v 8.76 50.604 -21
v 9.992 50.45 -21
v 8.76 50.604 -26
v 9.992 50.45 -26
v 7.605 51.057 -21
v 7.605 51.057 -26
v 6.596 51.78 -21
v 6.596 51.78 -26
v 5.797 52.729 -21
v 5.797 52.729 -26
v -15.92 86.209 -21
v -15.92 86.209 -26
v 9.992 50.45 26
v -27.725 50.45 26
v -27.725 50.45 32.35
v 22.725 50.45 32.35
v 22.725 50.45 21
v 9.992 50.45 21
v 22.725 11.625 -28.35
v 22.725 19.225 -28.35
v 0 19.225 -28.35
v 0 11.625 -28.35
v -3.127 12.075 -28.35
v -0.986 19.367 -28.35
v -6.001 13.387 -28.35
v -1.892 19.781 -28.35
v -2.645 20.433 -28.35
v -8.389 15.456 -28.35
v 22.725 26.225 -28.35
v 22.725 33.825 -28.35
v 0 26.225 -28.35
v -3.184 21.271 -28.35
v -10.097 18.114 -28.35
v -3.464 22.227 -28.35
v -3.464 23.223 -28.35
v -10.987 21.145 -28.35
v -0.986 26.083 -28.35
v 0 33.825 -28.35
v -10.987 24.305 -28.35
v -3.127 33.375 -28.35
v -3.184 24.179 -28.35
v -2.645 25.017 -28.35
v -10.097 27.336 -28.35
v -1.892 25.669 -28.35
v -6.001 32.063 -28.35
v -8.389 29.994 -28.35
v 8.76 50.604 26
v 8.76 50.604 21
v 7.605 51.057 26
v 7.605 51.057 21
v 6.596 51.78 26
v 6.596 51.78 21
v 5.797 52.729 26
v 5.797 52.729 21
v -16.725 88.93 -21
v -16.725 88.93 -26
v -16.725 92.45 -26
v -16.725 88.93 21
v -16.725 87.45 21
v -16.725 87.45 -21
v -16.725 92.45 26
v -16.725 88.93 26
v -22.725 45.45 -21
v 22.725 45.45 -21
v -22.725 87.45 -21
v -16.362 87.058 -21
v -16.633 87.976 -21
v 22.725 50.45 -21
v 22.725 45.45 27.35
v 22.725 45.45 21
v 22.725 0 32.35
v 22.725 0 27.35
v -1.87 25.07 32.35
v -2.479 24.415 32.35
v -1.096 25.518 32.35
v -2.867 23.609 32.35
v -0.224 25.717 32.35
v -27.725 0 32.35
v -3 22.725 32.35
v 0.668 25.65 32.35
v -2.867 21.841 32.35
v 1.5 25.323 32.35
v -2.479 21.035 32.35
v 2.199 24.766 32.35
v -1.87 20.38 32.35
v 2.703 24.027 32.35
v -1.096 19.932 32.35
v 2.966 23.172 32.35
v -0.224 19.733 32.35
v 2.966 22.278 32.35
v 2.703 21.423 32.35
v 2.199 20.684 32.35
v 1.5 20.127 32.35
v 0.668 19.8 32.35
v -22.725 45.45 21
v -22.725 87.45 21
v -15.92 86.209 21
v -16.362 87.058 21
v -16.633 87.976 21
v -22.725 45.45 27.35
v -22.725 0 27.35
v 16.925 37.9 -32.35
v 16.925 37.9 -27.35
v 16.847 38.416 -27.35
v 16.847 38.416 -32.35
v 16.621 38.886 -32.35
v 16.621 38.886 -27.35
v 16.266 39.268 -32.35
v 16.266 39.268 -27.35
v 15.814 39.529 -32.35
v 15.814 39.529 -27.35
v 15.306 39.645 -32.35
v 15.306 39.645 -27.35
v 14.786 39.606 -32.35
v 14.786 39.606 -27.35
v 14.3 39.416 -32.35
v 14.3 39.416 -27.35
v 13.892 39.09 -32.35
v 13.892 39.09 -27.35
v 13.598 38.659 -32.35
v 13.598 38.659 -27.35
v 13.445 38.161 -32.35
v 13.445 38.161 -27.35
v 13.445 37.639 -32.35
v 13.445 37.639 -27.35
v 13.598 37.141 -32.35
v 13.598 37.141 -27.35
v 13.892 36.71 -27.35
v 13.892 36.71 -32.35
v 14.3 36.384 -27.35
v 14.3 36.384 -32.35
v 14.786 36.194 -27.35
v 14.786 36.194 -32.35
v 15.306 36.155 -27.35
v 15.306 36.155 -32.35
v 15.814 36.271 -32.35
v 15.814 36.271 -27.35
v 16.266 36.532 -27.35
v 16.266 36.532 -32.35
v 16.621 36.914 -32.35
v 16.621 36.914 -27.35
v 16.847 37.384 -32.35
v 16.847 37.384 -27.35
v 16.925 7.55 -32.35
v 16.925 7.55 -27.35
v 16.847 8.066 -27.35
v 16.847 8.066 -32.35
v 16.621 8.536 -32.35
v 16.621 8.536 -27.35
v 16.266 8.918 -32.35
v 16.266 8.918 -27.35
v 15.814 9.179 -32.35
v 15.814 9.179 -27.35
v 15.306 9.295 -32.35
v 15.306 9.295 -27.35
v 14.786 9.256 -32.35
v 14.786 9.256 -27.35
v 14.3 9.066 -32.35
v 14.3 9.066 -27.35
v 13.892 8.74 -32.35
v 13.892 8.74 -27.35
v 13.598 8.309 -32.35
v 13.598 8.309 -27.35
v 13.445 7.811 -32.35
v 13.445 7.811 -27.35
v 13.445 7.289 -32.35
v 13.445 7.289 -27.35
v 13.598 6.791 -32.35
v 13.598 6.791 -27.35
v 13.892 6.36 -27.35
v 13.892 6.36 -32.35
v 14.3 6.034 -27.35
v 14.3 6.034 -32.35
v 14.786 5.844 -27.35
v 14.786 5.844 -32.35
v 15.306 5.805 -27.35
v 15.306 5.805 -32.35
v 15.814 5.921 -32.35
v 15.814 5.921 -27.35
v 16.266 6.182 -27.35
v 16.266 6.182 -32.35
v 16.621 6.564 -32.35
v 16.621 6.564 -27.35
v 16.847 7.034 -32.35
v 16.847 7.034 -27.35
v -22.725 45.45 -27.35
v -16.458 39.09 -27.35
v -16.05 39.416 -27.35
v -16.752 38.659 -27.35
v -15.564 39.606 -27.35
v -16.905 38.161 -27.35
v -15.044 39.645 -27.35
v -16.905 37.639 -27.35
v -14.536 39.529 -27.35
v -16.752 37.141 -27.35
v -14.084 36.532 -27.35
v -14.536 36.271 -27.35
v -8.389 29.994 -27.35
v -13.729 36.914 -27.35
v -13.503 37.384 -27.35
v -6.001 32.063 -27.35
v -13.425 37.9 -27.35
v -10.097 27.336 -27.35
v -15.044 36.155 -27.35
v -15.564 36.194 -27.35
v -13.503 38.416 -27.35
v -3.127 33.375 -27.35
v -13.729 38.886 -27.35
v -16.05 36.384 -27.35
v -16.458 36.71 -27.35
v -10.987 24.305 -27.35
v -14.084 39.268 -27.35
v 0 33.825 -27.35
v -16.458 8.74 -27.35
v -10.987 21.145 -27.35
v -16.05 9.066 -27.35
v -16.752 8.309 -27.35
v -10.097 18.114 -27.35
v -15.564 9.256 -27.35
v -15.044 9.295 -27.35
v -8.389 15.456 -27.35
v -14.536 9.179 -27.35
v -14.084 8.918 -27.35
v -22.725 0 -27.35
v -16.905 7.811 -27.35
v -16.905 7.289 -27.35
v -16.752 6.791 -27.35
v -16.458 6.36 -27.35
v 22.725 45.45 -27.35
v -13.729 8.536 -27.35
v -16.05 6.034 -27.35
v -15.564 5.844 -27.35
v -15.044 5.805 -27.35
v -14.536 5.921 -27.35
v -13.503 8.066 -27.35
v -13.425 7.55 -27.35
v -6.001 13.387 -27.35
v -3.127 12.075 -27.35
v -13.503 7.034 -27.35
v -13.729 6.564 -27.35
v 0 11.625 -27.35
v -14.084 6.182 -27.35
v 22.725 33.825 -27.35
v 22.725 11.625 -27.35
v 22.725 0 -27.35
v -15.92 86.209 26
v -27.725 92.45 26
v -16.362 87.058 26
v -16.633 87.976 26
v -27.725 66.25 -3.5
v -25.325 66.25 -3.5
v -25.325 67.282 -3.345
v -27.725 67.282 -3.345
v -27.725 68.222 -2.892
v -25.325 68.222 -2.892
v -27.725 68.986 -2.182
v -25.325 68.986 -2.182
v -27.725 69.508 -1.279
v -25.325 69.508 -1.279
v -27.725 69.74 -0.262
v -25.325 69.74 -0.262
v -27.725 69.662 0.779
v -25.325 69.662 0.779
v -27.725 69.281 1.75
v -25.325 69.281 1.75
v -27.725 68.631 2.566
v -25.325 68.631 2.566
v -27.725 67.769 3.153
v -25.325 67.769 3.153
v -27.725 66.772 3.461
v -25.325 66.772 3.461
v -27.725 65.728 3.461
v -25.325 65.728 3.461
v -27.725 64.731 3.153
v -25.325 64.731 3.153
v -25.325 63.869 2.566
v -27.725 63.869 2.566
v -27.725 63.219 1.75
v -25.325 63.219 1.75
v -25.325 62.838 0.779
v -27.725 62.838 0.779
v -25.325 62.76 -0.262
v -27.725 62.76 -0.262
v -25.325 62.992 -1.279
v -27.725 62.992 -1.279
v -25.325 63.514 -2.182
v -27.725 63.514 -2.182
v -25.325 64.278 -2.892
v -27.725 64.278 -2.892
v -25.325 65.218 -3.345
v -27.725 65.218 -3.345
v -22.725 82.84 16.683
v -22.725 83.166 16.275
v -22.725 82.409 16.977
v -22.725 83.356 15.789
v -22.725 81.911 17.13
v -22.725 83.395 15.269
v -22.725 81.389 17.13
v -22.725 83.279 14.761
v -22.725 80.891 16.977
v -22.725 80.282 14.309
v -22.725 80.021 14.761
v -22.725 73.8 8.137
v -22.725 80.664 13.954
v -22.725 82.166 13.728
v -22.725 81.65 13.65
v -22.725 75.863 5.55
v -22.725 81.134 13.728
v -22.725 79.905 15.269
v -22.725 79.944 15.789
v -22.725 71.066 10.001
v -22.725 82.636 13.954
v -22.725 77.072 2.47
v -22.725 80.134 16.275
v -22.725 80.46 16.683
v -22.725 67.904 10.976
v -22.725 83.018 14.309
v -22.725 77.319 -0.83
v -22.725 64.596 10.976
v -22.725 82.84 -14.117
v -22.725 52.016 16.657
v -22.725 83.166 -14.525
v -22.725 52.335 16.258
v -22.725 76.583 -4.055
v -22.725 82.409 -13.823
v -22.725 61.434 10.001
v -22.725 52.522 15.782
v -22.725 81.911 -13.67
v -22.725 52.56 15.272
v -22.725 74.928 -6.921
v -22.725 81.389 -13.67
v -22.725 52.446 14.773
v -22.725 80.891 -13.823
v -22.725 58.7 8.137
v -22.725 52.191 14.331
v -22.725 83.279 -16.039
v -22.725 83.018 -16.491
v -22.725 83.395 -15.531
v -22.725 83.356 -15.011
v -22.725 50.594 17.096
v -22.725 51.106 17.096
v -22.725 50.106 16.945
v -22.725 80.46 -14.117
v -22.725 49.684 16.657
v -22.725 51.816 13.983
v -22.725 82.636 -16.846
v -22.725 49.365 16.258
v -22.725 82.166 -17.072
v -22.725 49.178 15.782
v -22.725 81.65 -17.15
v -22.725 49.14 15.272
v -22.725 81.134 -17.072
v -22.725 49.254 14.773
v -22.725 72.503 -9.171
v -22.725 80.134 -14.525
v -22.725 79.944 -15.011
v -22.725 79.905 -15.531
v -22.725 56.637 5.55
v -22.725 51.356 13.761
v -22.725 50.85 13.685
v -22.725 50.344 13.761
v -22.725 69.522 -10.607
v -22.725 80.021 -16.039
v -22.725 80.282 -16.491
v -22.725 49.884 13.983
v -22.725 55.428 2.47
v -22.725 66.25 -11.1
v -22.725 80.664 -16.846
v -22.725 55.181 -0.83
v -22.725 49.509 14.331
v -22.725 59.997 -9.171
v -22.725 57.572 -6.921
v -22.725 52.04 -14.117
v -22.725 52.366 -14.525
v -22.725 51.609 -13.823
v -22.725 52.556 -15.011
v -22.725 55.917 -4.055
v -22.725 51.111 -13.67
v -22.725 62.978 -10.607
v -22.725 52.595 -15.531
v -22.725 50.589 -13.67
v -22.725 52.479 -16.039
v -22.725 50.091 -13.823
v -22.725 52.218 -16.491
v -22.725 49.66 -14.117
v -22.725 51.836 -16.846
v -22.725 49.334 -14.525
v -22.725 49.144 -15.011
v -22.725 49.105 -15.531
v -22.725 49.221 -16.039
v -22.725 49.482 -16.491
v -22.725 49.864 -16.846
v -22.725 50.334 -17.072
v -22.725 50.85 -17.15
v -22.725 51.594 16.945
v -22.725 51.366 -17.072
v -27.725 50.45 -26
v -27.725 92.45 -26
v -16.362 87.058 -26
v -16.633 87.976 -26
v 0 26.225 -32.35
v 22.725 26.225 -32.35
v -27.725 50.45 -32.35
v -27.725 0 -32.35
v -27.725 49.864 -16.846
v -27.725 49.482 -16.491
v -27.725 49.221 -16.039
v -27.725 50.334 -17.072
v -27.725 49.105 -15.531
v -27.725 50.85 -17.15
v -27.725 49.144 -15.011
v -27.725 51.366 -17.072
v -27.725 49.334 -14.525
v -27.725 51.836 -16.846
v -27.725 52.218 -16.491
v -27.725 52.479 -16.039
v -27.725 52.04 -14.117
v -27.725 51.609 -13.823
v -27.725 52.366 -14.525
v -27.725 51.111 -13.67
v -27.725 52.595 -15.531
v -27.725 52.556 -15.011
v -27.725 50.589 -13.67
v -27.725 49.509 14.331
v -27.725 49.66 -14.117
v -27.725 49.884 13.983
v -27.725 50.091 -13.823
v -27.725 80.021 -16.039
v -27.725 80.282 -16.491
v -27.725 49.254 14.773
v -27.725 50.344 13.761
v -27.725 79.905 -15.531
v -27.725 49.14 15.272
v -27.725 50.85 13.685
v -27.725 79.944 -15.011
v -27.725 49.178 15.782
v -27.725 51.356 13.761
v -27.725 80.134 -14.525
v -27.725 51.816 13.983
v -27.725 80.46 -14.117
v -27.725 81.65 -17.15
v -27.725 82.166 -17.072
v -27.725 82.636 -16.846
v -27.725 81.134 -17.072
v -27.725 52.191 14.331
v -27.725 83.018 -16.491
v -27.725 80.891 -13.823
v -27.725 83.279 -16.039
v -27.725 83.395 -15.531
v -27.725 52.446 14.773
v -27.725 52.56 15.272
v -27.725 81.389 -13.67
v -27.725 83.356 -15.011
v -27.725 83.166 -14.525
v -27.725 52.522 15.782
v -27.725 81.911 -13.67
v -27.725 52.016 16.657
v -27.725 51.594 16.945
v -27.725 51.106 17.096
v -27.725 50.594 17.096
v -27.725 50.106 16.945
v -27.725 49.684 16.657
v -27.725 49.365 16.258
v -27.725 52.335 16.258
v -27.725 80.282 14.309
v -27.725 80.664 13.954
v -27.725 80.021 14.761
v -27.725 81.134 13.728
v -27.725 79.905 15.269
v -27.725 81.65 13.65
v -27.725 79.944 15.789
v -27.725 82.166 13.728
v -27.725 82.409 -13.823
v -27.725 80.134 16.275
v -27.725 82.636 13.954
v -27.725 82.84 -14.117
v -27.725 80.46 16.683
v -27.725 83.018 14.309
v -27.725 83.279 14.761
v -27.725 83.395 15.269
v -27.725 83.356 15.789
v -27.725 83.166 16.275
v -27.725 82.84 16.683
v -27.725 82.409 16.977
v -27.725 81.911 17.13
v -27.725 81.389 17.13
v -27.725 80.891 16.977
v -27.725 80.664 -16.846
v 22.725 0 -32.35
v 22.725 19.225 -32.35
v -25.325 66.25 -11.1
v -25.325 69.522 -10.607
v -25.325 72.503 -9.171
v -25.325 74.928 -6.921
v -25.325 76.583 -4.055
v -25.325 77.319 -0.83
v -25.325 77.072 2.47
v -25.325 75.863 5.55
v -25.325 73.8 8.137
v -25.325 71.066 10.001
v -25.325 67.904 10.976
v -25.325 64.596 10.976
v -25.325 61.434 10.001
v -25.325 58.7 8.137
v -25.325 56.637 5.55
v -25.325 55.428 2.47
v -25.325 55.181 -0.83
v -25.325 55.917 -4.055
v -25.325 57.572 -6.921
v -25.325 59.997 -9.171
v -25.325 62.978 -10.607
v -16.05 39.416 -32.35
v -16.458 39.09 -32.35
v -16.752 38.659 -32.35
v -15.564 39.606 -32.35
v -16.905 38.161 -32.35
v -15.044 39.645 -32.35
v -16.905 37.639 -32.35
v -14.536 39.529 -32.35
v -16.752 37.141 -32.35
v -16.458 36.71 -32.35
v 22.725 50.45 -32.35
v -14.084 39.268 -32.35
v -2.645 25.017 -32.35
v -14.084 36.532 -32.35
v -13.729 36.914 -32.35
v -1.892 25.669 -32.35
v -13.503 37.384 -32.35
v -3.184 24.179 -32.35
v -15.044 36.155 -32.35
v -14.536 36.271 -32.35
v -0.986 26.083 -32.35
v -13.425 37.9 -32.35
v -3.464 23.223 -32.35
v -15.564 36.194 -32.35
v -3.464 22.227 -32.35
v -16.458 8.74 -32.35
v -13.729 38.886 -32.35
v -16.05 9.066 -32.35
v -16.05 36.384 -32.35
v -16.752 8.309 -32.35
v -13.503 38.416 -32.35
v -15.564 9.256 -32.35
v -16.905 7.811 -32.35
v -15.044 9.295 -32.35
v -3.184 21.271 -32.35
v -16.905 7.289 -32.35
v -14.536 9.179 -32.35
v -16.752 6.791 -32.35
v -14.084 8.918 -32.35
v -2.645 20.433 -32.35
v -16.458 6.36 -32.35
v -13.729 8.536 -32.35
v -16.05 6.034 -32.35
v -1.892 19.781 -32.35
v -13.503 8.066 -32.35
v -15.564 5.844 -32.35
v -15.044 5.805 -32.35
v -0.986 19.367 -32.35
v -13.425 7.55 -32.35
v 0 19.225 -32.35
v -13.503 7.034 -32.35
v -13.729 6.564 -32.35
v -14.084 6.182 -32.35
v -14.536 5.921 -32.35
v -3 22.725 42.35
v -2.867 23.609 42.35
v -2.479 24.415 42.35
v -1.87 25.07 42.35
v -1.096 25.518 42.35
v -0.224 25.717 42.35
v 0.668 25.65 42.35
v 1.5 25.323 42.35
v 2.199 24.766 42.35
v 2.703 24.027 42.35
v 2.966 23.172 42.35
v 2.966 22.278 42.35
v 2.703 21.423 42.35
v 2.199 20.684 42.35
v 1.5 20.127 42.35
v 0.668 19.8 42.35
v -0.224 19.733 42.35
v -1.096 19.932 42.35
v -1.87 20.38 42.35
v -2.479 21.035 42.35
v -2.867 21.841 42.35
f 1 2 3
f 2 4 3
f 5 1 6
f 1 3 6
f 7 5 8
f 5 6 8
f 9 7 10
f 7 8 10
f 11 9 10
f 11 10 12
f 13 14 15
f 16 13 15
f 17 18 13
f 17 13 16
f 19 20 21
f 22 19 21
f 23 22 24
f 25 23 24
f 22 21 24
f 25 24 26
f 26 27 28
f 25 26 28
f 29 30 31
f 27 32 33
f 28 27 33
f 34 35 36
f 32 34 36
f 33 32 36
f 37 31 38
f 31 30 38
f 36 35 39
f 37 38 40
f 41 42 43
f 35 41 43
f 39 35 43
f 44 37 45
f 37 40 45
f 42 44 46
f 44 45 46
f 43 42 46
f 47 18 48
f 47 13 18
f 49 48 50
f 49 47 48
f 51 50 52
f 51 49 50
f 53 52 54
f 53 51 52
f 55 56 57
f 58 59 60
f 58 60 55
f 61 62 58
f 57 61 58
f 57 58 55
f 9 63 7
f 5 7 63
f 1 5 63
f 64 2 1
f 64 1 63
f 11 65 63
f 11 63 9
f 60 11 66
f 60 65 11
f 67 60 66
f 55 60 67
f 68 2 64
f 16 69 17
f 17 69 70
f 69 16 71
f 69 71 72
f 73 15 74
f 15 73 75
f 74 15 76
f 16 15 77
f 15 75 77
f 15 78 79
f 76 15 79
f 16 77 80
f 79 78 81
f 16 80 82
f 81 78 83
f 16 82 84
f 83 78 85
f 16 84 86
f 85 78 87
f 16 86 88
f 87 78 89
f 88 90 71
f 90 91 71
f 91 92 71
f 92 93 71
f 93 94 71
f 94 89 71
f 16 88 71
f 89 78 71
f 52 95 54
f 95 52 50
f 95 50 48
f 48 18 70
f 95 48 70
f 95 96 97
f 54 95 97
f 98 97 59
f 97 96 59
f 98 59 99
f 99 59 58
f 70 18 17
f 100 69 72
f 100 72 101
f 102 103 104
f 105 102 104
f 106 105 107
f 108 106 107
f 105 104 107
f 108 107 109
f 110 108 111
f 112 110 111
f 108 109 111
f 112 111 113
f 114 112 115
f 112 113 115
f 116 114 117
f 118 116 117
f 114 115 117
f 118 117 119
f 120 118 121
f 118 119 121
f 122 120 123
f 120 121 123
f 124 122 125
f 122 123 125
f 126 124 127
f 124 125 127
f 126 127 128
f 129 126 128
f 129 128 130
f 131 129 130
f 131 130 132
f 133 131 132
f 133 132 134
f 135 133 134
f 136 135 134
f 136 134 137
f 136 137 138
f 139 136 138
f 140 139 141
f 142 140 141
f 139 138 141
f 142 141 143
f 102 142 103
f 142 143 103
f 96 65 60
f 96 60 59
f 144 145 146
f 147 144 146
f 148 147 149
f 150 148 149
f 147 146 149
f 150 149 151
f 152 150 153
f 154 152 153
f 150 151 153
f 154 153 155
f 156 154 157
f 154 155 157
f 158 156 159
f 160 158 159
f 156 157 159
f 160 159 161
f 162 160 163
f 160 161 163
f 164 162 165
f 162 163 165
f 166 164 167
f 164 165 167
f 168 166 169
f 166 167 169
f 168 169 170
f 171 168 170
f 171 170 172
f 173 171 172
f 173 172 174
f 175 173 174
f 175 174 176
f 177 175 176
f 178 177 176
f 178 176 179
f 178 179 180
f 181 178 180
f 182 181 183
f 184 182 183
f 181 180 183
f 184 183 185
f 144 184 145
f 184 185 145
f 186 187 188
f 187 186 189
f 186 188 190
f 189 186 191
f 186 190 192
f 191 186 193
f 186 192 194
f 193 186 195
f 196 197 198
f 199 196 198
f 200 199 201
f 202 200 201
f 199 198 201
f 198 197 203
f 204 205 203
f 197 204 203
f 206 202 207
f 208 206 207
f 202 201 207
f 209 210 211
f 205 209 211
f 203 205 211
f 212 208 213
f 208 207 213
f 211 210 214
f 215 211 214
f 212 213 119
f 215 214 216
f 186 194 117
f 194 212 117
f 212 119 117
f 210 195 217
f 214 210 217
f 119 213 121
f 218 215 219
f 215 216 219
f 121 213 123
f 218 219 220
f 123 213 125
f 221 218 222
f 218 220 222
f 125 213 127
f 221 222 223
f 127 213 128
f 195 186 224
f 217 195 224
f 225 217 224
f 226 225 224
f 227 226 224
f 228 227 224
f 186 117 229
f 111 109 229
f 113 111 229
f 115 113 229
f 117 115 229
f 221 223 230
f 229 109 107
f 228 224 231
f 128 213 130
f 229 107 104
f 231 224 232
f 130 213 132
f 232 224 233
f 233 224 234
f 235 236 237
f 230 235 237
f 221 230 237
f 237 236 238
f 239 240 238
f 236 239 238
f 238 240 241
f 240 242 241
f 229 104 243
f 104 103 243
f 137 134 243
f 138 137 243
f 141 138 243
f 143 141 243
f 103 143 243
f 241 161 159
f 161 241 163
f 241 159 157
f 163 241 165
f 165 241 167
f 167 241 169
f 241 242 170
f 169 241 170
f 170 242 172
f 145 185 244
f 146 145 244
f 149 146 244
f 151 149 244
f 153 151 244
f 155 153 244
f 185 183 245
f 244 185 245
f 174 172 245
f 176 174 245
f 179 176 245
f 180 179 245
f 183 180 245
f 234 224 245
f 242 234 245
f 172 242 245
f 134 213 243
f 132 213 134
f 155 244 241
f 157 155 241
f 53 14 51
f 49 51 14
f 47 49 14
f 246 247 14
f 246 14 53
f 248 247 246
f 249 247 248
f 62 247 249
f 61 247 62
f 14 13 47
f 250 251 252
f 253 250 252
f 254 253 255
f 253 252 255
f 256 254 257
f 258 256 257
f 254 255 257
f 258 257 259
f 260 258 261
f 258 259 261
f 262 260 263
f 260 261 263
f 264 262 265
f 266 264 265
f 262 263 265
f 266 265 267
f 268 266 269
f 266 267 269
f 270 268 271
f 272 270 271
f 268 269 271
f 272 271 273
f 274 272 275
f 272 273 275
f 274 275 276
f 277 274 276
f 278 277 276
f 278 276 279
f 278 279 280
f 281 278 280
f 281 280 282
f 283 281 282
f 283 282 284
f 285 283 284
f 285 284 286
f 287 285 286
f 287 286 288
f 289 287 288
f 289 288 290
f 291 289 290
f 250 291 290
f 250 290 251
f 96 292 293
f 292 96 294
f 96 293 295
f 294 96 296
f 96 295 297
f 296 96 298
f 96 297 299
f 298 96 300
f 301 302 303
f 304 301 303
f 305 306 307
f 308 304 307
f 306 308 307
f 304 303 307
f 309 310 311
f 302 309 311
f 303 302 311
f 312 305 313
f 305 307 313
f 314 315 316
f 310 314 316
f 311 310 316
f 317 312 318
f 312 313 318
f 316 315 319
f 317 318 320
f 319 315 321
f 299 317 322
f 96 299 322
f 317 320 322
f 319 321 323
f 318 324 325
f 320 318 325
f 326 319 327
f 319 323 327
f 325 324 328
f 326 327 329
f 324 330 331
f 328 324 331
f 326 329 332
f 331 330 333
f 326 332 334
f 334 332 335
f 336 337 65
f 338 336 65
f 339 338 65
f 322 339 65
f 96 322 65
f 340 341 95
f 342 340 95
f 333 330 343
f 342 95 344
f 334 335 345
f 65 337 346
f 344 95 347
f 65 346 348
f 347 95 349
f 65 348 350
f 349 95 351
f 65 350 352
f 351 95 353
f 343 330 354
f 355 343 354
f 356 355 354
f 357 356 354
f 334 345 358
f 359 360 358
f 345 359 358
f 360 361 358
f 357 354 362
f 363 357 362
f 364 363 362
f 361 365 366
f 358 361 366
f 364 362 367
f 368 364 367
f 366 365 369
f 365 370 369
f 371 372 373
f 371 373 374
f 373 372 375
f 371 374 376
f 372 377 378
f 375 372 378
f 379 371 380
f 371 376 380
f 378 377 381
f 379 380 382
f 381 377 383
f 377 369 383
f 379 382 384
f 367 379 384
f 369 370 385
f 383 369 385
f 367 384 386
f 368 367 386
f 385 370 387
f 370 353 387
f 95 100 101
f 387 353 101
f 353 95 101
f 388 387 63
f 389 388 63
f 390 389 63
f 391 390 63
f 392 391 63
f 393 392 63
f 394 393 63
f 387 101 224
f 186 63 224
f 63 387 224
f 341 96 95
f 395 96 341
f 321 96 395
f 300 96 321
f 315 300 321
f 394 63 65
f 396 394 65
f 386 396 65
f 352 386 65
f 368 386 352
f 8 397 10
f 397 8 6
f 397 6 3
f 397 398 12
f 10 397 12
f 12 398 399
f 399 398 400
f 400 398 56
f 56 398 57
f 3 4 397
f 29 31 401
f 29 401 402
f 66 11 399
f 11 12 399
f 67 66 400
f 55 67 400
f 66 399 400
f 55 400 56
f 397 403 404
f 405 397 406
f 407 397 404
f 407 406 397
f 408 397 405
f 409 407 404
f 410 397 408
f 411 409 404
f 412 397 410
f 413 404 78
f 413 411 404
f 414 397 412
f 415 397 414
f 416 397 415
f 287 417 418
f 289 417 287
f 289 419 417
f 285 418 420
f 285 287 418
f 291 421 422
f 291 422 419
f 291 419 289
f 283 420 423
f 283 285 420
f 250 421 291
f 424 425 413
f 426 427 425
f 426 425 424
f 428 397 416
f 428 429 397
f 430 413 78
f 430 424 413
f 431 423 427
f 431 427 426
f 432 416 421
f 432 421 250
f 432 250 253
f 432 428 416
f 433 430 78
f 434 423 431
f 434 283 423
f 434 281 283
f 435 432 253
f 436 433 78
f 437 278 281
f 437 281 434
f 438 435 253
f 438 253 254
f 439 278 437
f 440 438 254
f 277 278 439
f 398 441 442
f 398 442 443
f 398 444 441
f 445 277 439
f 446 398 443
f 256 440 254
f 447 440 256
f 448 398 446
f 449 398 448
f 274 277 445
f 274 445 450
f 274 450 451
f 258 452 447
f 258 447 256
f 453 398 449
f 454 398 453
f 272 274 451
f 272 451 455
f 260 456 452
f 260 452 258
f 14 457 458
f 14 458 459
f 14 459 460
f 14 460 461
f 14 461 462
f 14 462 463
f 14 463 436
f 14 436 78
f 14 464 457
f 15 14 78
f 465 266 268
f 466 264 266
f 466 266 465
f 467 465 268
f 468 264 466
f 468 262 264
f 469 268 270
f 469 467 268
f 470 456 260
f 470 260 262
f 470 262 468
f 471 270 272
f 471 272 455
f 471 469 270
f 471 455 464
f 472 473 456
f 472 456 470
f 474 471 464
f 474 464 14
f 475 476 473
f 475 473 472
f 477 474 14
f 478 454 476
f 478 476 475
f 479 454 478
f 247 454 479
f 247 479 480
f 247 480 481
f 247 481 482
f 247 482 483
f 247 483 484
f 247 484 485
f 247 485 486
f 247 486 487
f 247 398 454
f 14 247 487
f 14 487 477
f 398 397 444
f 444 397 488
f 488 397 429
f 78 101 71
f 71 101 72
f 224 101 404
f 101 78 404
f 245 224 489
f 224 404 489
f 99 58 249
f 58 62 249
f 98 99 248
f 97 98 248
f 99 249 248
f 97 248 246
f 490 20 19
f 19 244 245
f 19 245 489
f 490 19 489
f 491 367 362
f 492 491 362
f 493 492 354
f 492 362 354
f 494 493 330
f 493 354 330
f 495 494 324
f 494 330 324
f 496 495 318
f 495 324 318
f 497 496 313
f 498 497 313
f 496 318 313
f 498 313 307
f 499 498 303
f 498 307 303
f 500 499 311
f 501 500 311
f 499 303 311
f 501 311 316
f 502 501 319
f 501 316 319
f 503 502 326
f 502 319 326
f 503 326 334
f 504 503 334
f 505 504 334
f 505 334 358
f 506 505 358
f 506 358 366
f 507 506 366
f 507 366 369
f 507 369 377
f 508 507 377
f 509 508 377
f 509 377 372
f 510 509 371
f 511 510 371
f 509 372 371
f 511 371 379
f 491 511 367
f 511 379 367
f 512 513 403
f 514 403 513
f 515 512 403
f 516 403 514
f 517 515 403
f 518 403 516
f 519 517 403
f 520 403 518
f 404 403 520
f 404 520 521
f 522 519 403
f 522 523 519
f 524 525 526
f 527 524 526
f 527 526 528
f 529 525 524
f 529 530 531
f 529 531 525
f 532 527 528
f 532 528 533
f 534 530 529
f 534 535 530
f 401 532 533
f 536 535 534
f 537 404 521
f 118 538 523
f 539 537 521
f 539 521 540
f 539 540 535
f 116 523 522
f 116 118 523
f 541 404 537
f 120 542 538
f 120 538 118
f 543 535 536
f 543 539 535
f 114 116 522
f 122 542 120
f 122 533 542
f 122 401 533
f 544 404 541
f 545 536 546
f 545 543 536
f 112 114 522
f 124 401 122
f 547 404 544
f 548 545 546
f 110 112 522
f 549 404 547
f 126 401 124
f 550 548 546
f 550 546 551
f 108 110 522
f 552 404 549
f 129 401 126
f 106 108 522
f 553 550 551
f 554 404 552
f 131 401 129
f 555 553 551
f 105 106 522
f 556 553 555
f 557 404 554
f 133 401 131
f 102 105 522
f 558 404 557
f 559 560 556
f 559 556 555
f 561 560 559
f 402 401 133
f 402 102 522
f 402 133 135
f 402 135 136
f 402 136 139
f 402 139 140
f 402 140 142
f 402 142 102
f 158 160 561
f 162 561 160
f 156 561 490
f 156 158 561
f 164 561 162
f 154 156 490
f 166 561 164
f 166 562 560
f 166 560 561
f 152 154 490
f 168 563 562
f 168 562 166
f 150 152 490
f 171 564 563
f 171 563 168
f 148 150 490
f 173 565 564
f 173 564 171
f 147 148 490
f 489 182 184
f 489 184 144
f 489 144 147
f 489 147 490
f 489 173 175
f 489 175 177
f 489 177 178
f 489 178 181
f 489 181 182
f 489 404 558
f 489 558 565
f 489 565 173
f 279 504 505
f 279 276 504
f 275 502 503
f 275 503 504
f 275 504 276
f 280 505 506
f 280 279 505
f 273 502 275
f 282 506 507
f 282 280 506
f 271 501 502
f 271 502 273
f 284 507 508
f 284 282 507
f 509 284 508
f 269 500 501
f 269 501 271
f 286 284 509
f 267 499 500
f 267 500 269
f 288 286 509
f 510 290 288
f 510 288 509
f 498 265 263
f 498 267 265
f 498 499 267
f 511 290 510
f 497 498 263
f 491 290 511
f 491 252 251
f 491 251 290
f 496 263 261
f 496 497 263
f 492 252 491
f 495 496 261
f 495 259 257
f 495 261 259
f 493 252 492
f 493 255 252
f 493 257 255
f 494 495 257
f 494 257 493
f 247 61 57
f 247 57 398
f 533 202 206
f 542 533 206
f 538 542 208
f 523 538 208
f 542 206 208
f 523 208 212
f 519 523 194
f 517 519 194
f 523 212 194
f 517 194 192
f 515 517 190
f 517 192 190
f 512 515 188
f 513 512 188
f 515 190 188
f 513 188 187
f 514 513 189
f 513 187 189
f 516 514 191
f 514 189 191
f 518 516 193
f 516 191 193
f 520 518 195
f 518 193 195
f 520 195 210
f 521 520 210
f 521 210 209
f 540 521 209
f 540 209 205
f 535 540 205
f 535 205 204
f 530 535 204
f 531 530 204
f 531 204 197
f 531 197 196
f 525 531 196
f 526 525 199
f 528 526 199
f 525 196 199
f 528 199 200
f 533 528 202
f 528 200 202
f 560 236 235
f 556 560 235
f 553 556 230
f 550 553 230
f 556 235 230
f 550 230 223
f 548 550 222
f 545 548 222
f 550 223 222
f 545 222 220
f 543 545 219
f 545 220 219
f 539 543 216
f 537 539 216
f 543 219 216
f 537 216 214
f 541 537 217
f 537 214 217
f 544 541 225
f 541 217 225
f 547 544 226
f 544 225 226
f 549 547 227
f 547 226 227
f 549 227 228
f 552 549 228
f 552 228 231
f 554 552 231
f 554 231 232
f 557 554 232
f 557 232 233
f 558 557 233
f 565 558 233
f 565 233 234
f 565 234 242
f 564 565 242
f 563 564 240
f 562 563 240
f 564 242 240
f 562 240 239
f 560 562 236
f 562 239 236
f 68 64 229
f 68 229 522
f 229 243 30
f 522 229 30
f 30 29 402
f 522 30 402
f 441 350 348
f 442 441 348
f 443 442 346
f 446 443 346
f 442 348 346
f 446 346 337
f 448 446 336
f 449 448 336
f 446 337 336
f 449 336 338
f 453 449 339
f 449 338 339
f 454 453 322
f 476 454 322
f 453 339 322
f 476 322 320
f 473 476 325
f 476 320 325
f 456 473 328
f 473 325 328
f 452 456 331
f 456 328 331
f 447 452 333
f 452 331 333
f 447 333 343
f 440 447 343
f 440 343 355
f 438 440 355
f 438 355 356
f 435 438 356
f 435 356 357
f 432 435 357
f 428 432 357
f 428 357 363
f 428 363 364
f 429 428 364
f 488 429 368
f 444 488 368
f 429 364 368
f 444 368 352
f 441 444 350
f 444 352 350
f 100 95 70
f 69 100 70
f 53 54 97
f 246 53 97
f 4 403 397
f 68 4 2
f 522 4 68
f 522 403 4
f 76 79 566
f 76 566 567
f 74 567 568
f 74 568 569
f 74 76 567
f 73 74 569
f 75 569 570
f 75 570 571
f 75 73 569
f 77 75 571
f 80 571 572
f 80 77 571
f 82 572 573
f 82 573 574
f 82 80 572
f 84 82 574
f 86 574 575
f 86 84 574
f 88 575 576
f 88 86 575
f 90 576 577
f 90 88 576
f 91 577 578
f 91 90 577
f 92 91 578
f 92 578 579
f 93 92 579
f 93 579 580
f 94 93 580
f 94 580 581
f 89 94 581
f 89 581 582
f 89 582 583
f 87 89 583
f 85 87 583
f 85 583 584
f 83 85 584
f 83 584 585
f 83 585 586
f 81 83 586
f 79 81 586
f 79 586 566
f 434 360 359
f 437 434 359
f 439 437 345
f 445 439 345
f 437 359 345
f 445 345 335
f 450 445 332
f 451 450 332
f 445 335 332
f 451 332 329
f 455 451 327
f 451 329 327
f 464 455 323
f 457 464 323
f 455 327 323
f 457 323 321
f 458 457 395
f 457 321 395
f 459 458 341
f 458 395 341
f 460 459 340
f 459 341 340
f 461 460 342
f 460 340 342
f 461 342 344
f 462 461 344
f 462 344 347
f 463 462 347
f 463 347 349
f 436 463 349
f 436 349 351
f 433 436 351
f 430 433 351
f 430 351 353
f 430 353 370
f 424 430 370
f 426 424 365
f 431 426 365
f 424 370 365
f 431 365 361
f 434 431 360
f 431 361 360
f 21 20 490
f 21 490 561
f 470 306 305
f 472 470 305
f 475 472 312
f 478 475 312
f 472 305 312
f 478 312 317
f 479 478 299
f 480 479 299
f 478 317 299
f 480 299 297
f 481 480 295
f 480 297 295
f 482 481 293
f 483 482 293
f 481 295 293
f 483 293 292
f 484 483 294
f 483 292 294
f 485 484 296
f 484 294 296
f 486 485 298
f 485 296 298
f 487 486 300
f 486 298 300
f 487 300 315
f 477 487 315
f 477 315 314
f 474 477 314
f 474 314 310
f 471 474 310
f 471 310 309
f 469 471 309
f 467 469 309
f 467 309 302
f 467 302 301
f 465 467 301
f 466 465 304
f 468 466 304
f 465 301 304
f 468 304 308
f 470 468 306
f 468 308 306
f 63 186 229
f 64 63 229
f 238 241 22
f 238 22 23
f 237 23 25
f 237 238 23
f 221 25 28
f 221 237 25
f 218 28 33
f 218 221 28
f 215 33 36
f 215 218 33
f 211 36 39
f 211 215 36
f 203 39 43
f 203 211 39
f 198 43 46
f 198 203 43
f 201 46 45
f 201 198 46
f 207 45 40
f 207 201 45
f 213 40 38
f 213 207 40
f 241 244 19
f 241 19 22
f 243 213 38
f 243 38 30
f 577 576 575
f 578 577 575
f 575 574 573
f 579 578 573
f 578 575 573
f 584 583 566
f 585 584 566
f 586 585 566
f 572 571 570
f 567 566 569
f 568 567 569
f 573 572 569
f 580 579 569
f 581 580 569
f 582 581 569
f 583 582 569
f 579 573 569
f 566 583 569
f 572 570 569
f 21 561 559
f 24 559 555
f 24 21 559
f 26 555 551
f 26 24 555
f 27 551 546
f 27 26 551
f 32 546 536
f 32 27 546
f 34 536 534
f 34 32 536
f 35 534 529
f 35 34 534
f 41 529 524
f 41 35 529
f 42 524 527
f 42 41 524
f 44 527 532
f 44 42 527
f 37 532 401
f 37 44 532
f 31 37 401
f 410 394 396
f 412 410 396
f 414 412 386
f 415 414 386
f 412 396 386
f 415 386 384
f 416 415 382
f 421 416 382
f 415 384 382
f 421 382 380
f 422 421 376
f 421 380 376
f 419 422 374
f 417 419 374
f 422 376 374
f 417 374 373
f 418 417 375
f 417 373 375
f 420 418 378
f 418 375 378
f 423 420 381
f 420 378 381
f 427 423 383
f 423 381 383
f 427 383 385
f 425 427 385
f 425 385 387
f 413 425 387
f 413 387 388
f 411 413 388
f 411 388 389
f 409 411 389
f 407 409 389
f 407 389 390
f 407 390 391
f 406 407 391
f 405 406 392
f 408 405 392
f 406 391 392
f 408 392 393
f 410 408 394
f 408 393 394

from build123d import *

# Parameters (mm, degrees)
BOSS_EXTRUDE1_DEPTH = 45.45
CUT_EXTRUDE4_DEPTH  = 1
CUT_EXTRUDE5_DEPTH  = 5
SKETCH9_R           = 1.75
CUT_EXTRUDE6_DEPTH  = 5
BOSS_EXTRUDE2_DEPTH = 5
SKETCH11_R          = 1.75
SKETCH11_R_2        = 1.715
CUT_EXTRUDE7_DEPTH  = 5
SKETCH13_R          = 3.5
CUT_EXTRUDE8_DEPTH  = 5
SKETCH13_3_R        = 11.1
CUT_EXTRUDE9_DEPTH  = 2.6
SKETCH14_W          = 50.45
SKETCH14_H          = 11.35
BOSS_EXTRUDE3_DEPTH = 5
SKETCH15_W          = 50.45
SKETCH15_H          = 11.35
BOSS_EXTRUDE4_DEPTH = 5
SKETCH17_W          = 42
SKETCH17_H          = 5
BOSS_EXTRUDE5_DEPTH = 11
BOSS_EXTRUDE6_DEPTH = 5
BOSS_EXTRUDE7_DEPTH = 5
SKETCH21_R          = 3
BOSS_EXTRUDE8_DEPTH = 15
FILLET1_R           = 5
FILLET2_R           = 5


with BuildPart() as part:
    # Sketch1 → Boss-Extrude1 (new body)
    with BuildSketch(Plane(origin=(0, 0, 0), x_dir=(1, 0, 0), z_dir=(0, 1, 0))):
        Polygon((22.725, 27.35), (22.725, 32.35), (-22.725, 32.35), (-27.725, 32.35), (-27.725, -27.35), (-27.725, -32.35), (22.725, -32.35), (22.725, -27.35), (-22.725, -27.35), (-22.725, 27.35), (0, 27.35), align=None)
    extrude(amount=BOSS_EXTRUDE1_DEPTH)

    # Sketch5 → Cut-Extrude4 (cut)
    with BuildSketch(Plane.XY.offset(-27.35)):
        with BuildLine():
            Line((0, 33.825), (22.725, 33.825))
            Line((22.725, 33.825), (22.725, 11.625))
            Line((22.725, 11.625), (0, 11.625))
            ThreePointArc((0, 11.625), (-11.1, 22.725), (0, 33.825))
        make_face()
    extrude(amount=-CUT_EXTRUDE4_DEPTH, mode=Mode.SUBTRACT)

    # Sketch6 → Cut-Extrude5 (cut)
    with BuildSketch(Plane.XY.offset(-27.35)):
        with BuildLine():
            Line((0, 26.225), (22.725, 26.225))
            Line((22.725, 26.225), (22.725, 19.225))
            Line((22.725, 19.225), (0, 19.225))
            ThreePointArc((0, 19.225), (-3.5, 22.725), (0, 26.225))
        make_face()
    extrude(amount=-CUT_EXTRUDE5_DEPTH, mode=Mode.SUBTRACT)

    # Sketch9 → Cut-Extrude6 (cut)
    with BuildSketch(Plane.XY.offset(-27.35)):
        with Locations((15.175, 37.9)):
            Circle(SKETCH9_R)
        with Locations((-15.175, 37.9)):
            Circle(SKETCH9_R)
        with Locations((15.175, 7.55)):
            Circle(SKETCH9_R)
        with Locations((-15.175, 7.55)):
            Circle(SKETCH9_R)
    extrude(amount=-CUT_EXTRUDE6_DEPTH, mode=Mode.SUBTRACT)

    # Sketch10 → Boss-Extrude2 (add)
    with BuildSketch(Plane(origin=(-22.725, 0, 0), x_dir=(0, 0, -1), z_dir=(1, 0, 0))):
        Polygon((0, 45.45), (21, 45.45), (21, 87.45), (-21, 87.45), (-21, 45.45), align=None)
    extrude(amount=-BOSS_EXTRUDE2_DEPTH)

    # Sketch11 → Cut-Extrude7 (cut)
    with BuildSketch(Plane(origin=(-22.725, 0, 0), x_dir=(0, 0, -1), z_dir=(1, 0, 0))):
        with Locations((-15.4, 81.65)):
            Circle(SKETCH11_R)
        with Locations((15.4, 81.65)):
            Circle(SKETCH11_R)
        with Locations((-15.4, 50.85)):
            Circle(SKETCH11_R_2)
        with Locations((15.4, 50.85)):
            Circle(SKETCH11_R)
    extrude(amount=-CUT_EXTRUDE7_DEPTH, mode=Mode.SUBTRACT)

    # Sketch13 → Cut-Extrude8 (cut)
    with BuildSketch(Plane(origin=(-22.725, 0, 0), x_dir=(0, 0, -1), z_dir=(1, 0, 0))):
        with Locations((0, 66.25)):
            Circle(SKETCH13_R)
    extrude(amount=-CUT_EXTRUDE8_DEPTH, mode=Mode.SUBTRACT)

    # Sketch13<3> → Cut-Extrude9 (cut)
    with BuildSketch(Plane(origin=(-22.725, 0, 0), x_dir=(0, 0, -1), z_dir=(1, 0, 0))):
        with Locations((0, 66.25)):
            Circle(SKETCH13_3_R)
    extrude(amount=-CUT_EXTRUDE9_DEPTH, mode=Mode.SUBTRACT)

    # Sketch14 → Boss-Extrude3 (add)
    with BuildSketch(Plane(origin=(0, 45.45, 0), x_dir=(1, 0, 0), z_dir=(0, 1, 0))):
        with Locations((-2.5, 26.675)):
            Rectangle(SKETCH14_W, SKETCH14_H)
    extrude(amount=BOSS_EXTRUDE3_DEPTH)

    # Sketch15 → Boss-Extrude4 (add)
    with BuildSketch(Plane(origin=(0, 45.45, 0), x_dir=(1, 0, 0), z_dir=(0, 1, 0))):
        with Locations((-2.5, -26.675)):
            Rectangle(SKETCH15_W, SKETCH15_H)
    extrude(amount=BOSS_EXTRUDE4_DEPTH)

    # Sketch17 → Boss-Extrude5 (add)
    with BuildSketch(Plane.ZY.offset(27.725)):
        with Locations((0, 89.95)):
            Rectangle(SKETCH17_W, SKETCH17_H)
    extrude(amount=-BOSS_EXTRUDE5_DEPTH)

    # Sketch19 → Boss-Extrude6 (add)
    with BuildSketch(Plane.XY.offset(21)):
        Polygon((-22.725, 50.45), (7.275, 50.45), (-16.725, 87.45), (-16.725, 92.45), (-27.725, 92.45), (-27.725, 50.45), align=None)
    extrude(amount=BOSS_EXTRUDE6_DEPTH)

    # Sketch20 → Boss-Extrude7 (add)
    with BuildSketch(Plane(origin=(0, 0, -21), x_dir=(-1, 0, 0), z_dir=(0, 0, -1))):
        Polygon((22.725, 50.45), (-7.275, 50.45), (16.725, 87.45), (16.725, 92.45), (27.725, 92.45), (27.725, 50.45), align=None)
    extrude(amount=BOSS_EXTRUDE7_DEPTH)

    # Sketch21 → Boss-Extrude8 (add)
    with BuildSketch(Plane(origin=(0, 0, 27.35), x_dir=(-1, 0, 0), z_dir=(0, 0, -1))):
        with Locations((0, 22.725)):
            Circle(SKETCH21_R)
    extrude(amount=-BOSS_EXTRUDE8_DEPTH)

    # Fillet1
    fillet1_edges = [part.edges().sort_by_distance(p)[0] for p in [
        (7.275, 50.45, 23.5),
        (7.275, 50.45, -23.5),
    ]]
    fillet(fillet1_edges, radius=FILLET1_R)

    # Fillet2
    fillet2_edges = [part.edges().sort_by_distance(p)[0] for p in [
        (-16.725, 87.45, 23.5),
        (-16.725, 87.45, -23.5),
    ]]
    fillet(fillet2_edges, radius=FILLET2_R)


solid = part.part
